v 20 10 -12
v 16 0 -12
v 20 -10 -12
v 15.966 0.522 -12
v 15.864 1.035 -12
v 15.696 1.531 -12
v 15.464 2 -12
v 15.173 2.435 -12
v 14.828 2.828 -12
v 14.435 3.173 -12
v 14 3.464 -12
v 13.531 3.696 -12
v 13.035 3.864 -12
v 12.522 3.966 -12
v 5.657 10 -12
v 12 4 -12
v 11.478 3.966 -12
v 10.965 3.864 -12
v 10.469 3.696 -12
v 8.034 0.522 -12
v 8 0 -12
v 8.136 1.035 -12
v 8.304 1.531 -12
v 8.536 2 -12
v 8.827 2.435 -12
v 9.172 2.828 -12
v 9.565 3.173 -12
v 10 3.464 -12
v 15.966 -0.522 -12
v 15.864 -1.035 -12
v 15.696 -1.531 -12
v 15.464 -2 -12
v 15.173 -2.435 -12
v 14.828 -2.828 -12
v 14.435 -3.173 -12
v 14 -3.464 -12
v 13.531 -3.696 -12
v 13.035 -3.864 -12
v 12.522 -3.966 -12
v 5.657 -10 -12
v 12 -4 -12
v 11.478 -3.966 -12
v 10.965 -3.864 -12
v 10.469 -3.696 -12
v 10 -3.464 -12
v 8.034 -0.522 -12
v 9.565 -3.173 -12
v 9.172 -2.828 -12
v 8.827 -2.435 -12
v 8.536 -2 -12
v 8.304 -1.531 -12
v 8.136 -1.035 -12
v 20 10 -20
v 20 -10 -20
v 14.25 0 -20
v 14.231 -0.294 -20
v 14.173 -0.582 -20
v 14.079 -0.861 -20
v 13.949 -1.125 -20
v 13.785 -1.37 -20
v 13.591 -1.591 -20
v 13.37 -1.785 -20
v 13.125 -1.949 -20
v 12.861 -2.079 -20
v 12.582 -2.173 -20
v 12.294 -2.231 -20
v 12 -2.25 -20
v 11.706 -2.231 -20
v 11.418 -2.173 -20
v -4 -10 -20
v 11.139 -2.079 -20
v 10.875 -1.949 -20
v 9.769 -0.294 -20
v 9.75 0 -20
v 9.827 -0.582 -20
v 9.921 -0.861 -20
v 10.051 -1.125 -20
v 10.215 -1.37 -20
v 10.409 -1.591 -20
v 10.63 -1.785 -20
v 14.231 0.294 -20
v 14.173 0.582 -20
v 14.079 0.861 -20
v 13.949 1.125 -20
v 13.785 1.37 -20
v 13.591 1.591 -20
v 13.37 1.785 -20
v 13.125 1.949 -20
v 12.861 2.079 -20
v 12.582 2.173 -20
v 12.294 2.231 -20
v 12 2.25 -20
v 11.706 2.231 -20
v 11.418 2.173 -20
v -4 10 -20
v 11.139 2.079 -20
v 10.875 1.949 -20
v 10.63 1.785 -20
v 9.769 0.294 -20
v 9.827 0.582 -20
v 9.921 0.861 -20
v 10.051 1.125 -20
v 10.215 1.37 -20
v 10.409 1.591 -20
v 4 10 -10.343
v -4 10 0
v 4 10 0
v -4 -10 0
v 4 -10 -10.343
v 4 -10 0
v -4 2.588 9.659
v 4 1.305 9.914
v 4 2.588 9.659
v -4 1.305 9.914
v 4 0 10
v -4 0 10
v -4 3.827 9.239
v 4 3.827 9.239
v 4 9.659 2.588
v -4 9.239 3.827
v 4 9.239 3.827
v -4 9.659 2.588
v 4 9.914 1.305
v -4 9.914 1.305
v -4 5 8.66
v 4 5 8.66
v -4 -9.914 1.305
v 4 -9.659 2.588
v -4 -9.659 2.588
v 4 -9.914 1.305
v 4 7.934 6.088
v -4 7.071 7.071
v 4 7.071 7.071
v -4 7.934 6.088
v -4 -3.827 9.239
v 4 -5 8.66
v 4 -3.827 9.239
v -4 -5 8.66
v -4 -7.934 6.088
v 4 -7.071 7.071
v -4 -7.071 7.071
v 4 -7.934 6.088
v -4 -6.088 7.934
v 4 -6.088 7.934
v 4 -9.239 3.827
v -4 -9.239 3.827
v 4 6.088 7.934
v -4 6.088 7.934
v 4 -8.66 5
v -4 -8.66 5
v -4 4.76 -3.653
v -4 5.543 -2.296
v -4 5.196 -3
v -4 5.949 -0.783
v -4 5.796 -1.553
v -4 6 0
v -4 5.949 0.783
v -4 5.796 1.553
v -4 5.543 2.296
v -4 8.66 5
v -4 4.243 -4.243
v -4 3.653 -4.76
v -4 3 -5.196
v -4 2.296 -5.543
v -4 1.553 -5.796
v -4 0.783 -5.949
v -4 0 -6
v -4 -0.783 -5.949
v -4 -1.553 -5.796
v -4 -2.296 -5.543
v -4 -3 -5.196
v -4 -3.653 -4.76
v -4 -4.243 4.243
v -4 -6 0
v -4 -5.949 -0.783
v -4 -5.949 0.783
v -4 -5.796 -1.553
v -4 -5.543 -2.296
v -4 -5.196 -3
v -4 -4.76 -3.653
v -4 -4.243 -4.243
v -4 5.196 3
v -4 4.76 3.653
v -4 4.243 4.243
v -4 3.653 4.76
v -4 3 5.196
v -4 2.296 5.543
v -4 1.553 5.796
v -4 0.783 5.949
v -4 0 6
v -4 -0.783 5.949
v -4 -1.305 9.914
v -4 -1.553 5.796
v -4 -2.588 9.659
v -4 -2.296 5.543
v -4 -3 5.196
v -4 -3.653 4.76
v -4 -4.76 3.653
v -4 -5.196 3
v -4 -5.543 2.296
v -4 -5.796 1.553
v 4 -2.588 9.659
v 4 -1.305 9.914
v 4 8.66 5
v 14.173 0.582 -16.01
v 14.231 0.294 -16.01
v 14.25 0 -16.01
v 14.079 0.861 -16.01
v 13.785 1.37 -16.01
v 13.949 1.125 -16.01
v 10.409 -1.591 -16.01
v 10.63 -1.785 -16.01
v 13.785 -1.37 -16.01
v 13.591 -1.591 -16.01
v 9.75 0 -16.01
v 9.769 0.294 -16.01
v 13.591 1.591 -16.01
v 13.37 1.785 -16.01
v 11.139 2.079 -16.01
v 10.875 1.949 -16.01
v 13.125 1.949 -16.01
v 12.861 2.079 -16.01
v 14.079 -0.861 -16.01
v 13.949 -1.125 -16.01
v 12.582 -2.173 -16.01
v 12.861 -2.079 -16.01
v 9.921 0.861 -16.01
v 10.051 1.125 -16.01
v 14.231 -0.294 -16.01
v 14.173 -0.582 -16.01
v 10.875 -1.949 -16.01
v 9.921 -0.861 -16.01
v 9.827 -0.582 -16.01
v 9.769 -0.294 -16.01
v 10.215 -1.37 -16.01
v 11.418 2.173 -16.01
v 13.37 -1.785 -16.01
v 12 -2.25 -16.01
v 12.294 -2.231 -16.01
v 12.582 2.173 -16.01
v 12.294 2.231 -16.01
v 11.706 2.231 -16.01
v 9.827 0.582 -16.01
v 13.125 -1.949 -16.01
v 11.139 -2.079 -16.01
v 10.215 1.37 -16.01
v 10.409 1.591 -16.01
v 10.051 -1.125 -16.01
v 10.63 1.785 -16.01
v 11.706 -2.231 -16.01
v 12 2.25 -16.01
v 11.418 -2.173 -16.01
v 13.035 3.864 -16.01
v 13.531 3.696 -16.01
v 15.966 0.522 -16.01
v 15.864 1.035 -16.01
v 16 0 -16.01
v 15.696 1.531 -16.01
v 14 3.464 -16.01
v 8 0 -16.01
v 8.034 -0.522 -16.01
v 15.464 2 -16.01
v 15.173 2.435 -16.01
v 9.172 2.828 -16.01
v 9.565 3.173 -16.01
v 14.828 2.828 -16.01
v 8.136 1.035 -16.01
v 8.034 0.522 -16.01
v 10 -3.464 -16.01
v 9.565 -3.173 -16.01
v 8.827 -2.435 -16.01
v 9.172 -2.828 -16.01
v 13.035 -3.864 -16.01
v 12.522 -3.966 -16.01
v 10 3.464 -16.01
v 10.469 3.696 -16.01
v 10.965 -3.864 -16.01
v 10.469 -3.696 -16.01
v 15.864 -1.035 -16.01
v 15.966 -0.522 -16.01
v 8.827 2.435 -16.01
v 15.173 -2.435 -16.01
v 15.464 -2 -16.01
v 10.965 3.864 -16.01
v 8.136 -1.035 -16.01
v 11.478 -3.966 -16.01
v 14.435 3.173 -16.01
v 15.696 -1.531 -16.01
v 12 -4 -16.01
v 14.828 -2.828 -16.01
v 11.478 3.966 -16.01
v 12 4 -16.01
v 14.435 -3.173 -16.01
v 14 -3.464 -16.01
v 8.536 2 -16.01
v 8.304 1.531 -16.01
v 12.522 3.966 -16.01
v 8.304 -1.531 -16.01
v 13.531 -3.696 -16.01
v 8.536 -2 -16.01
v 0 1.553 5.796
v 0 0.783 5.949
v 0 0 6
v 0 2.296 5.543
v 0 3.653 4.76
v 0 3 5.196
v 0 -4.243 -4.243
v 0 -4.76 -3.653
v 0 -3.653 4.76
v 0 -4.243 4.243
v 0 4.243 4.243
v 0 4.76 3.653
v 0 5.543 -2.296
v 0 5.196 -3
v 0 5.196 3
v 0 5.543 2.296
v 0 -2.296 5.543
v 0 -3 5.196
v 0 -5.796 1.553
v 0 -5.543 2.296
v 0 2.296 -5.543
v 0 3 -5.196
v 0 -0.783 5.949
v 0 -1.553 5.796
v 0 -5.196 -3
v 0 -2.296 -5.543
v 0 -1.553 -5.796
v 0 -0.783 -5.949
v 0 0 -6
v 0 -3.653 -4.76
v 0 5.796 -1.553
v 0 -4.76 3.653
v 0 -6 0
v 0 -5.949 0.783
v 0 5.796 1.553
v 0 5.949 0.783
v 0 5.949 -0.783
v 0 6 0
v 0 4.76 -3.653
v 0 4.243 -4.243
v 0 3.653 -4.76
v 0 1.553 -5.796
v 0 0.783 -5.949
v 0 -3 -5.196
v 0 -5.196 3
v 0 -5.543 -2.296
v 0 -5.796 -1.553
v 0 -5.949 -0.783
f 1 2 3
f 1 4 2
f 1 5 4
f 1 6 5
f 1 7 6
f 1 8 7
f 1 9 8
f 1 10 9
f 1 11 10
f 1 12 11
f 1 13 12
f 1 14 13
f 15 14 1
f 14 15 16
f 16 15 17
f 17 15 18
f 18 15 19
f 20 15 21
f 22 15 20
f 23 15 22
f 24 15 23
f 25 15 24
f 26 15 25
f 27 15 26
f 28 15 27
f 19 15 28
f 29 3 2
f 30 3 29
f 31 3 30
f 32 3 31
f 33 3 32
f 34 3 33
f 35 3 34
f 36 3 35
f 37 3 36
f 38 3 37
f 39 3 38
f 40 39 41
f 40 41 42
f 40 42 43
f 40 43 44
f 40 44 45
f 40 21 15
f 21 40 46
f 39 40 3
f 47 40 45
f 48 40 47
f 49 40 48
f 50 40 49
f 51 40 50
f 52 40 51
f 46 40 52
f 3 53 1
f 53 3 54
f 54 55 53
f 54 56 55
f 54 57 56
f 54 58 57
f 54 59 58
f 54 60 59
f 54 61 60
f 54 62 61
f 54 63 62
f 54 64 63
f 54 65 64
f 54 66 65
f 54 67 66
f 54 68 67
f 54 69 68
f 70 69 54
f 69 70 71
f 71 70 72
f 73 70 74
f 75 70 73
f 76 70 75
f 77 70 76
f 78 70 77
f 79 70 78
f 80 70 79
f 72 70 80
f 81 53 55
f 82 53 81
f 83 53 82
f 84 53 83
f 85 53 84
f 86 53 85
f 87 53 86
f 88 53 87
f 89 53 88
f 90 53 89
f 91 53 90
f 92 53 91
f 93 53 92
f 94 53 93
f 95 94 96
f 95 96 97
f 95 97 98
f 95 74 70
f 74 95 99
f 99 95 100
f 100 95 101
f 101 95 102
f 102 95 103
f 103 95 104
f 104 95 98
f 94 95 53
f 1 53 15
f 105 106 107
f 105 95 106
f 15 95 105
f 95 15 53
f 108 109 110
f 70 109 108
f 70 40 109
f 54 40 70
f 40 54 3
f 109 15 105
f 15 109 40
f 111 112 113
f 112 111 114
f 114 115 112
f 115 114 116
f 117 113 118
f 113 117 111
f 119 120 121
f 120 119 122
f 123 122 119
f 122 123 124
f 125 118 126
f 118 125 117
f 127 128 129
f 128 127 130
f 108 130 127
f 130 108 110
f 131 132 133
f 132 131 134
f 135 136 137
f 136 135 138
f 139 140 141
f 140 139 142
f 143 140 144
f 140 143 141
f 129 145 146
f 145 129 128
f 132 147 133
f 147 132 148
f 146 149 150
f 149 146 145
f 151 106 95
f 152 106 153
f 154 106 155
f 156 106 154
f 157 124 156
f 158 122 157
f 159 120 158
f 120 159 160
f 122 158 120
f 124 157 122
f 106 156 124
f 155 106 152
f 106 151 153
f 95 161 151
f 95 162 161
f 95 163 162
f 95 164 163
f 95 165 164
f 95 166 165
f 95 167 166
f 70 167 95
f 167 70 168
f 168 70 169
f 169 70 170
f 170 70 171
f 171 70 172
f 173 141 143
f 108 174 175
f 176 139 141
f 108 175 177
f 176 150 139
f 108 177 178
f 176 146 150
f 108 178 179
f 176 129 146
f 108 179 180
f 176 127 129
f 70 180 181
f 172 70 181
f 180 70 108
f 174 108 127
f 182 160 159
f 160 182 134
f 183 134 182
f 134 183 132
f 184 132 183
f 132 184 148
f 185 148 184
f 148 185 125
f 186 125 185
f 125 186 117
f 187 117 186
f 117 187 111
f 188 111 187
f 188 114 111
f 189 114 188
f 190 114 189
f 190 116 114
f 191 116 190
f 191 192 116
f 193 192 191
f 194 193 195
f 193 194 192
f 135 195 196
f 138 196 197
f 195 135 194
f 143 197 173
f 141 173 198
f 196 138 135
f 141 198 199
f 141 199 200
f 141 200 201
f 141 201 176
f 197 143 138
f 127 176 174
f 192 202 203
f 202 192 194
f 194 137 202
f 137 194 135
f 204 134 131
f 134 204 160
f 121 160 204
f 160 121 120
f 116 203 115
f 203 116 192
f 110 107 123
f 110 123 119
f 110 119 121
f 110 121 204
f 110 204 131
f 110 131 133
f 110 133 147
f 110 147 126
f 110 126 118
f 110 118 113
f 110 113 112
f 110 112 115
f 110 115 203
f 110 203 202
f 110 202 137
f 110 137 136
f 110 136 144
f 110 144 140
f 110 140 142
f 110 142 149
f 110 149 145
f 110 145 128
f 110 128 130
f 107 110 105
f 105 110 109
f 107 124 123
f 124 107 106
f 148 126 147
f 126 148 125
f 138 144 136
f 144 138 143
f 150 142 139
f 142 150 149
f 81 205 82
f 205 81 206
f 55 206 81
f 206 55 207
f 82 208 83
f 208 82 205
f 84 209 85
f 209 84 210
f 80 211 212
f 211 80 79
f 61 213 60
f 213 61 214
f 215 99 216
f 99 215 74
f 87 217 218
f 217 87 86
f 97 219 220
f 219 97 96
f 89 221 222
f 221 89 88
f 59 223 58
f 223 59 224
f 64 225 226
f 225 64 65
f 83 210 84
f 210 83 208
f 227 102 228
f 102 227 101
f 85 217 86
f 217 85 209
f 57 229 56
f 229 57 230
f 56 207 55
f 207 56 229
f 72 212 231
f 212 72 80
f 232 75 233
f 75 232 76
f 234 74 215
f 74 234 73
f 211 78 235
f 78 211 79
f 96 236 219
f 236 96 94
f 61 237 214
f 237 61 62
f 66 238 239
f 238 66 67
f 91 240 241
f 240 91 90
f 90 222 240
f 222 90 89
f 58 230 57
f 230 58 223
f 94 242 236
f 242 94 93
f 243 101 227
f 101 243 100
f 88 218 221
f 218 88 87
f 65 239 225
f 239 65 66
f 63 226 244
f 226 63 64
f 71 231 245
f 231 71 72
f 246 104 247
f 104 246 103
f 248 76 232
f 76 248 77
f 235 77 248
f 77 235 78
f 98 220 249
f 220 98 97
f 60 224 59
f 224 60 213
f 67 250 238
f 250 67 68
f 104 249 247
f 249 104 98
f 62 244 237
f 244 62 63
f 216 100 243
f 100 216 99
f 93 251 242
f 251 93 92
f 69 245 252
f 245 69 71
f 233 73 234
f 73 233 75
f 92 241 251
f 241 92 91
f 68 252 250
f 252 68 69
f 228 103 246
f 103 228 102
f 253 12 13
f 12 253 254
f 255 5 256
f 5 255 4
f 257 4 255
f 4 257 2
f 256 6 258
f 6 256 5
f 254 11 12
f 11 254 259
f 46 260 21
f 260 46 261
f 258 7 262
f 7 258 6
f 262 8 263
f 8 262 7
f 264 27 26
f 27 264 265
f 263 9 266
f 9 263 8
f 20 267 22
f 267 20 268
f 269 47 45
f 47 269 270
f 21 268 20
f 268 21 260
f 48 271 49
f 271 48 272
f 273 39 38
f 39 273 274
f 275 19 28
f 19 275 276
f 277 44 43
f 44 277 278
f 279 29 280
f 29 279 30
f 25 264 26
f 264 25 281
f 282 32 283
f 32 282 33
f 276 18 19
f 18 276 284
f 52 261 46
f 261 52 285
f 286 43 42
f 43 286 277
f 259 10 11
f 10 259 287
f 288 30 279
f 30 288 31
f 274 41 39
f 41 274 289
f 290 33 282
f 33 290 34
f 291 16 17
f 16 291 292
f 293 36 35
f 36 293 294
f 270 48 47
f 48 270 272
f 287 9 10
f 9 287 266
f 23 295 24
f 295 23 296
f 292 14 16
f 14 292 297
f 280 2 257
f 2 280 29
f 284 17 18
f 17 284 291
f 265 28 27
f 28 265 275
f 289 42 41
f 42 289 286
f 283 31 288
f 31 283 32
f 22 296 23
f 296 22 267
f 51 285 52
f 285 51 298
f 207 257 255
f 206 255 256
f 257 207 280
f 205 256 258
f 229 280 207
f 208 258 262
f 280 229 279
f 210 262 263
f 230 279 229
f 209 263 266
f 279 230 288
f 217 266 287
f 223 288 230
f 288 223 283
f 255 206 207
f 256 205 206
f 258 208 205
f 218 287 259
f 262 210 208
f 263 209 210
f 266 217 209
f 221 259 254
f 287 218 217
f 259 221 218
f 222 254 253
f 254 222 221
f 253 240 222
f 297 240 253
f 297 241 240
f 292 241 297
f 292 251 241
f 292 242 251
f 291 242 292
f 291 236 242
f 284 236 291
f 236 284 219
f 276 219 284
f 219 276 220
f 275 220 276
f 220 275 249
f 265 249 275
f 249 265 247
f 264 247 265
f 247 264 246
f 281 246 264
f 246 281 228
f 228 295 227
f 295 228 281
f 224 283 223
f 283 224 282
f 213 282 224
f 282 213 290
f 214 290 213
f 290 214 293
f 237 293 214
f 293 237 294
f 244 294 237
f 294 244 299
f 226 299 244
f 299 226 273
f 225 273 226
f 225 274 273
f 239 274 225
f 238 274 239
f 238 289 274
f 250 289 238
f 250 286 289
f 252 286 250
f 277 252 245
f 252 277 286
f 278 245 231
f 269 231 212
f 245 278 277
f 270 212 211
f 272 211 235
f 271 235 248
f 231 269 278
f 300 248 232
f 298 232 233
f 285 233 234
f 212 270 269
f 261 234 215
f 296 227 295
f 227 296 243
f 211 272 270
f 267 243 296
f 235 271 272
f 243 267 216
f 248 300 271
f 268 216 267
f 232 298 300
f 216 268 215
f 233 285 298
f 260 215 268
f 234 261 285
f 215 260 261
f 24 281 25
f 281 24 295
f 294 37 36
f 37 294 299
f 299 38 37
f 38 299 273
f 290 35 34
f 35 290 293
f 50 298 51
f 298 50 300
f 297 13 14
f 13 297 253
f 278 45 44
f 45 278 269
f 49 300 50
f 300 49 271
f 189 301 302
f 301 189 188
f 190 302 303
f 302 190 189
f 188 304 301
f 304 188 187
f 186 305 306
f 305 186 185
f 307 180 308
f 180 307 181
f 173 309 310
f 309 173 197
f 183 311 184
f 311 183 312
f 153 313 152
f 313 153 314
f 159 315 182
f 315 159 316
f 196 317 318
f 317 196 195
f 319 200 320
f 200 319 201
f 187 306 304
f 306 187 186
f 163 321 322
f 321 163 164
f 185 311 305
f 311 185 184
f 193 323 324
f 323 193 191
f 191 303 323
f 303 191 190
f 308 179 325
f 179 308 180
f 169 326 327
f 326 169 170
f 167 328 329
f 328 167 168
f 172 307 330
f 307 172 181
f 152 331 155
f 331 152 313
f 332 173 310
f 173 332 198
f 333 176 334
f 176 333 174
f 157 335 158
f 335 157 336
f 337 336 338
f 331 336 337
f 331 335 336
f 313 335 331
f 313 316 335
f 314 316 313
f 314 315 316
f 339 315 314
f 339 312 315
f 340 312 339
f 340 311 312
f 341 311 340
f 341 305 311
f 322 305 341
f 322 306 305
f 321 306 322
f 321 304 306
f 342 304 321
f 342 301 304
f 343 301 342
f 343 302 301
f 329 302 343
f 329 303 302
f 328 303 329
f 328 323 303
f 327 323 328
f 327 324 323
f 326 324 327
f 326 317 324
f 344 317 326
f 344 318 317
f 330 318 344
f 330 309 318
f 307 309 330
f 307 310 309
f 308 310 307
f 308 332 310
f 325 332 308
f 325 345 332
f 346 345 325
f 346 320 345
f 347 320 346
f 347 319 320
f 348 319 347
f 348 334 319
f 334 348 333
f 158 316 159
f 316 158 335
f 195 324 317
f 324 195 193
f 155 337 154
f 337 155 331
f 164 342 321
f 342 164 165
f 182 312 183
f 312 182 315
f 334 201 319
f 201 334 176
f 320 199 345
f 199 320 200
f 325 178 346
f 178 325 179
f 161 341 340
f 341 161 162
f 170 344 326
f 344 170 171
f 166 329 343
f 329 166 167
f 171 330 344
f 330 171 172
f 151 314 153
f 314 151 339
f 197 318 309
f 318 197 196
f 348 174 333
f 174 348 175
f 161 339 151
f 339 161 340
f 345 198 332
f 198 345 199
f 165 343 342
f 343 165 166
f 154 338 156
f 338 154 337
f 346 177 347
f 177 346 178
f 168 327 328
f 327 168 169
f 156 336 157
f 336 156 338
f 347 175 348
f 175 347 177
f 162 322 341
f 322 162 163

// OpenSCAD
/*Part*/

//Endpiece or centerpiece?
piece = "end"; //[end: endpiece, center: centerpiece]

//Bearing (round) or nut (6-sided)?
hole = "bearing"; //[bearing, nut]

/*Dimensions*/

//Outer bearing / nut diameter (M3: 6.1; M4: 7.8; M5: 8.7; M6: 11.0 ...)
d_bearing = 12;

//Total width
width = 20;

//Thickness (should be 2*bearing/nut thickness for endpiece, 1*bearing/nut thickness for centerpiece)
thickness = 8;

//Fixing screw lower diameter (thread diameter)
M = 4.5;

//Fixing screw upper diameter (screw head dimeter)
M2 = 8.0;



/*Hidden*/
$fn = 48;

echo($fn);

ra = width /2;
ri = d_bearing /2;
hi = thickness /2;

if(piece == "end")
    if(hole == "bearing")
        holder($fn, false);
    else
        holder(6, false);
else 
    if(hole == "bearing"){
        holder($fn, true);
        rotate([0,0,180])
        holder($fn, true);}
    else{
        holder(6, true);
        rotate([0,0,180])
        holder($fn, true);}


module holder(ffn, piece) {
    rotate([0,-90,0])
difference(){
    union(){
        cylinder(h = hi * 2, r = ra, center = true);
        translate([-ra,0,0]) cube([ra*2,ra*2,hi*2], center = true);
        
        translate([-ra*2 + hi,0,-ra]) {
            difference(){
                union(){
                    cube([hi*2,ra*2,ra*2], center = true);
        translate([hi,0,ra])
        rotate([0,45,0])
        cube([hi*2,ra*2,hi*2], center = true);}
        translate([hi,0,ra+hi])
        cube([hi*4,ra*2,hi*2], center = true);
        }}}
    
    cylinder(h = hi*2.001, r = ri, center = piece, $fn = ffn);
        
    translate([-ra*2 - 0.01,0,-ra*1.2])
    rotate([0,90,0])
    
    {cylinder(h = hi*1.01, r = M/2, center = false);
     translate([0,0,hi]) cylinder(h = hi*1.01, r = M2/2, center = false);   
    }   
    }
}
